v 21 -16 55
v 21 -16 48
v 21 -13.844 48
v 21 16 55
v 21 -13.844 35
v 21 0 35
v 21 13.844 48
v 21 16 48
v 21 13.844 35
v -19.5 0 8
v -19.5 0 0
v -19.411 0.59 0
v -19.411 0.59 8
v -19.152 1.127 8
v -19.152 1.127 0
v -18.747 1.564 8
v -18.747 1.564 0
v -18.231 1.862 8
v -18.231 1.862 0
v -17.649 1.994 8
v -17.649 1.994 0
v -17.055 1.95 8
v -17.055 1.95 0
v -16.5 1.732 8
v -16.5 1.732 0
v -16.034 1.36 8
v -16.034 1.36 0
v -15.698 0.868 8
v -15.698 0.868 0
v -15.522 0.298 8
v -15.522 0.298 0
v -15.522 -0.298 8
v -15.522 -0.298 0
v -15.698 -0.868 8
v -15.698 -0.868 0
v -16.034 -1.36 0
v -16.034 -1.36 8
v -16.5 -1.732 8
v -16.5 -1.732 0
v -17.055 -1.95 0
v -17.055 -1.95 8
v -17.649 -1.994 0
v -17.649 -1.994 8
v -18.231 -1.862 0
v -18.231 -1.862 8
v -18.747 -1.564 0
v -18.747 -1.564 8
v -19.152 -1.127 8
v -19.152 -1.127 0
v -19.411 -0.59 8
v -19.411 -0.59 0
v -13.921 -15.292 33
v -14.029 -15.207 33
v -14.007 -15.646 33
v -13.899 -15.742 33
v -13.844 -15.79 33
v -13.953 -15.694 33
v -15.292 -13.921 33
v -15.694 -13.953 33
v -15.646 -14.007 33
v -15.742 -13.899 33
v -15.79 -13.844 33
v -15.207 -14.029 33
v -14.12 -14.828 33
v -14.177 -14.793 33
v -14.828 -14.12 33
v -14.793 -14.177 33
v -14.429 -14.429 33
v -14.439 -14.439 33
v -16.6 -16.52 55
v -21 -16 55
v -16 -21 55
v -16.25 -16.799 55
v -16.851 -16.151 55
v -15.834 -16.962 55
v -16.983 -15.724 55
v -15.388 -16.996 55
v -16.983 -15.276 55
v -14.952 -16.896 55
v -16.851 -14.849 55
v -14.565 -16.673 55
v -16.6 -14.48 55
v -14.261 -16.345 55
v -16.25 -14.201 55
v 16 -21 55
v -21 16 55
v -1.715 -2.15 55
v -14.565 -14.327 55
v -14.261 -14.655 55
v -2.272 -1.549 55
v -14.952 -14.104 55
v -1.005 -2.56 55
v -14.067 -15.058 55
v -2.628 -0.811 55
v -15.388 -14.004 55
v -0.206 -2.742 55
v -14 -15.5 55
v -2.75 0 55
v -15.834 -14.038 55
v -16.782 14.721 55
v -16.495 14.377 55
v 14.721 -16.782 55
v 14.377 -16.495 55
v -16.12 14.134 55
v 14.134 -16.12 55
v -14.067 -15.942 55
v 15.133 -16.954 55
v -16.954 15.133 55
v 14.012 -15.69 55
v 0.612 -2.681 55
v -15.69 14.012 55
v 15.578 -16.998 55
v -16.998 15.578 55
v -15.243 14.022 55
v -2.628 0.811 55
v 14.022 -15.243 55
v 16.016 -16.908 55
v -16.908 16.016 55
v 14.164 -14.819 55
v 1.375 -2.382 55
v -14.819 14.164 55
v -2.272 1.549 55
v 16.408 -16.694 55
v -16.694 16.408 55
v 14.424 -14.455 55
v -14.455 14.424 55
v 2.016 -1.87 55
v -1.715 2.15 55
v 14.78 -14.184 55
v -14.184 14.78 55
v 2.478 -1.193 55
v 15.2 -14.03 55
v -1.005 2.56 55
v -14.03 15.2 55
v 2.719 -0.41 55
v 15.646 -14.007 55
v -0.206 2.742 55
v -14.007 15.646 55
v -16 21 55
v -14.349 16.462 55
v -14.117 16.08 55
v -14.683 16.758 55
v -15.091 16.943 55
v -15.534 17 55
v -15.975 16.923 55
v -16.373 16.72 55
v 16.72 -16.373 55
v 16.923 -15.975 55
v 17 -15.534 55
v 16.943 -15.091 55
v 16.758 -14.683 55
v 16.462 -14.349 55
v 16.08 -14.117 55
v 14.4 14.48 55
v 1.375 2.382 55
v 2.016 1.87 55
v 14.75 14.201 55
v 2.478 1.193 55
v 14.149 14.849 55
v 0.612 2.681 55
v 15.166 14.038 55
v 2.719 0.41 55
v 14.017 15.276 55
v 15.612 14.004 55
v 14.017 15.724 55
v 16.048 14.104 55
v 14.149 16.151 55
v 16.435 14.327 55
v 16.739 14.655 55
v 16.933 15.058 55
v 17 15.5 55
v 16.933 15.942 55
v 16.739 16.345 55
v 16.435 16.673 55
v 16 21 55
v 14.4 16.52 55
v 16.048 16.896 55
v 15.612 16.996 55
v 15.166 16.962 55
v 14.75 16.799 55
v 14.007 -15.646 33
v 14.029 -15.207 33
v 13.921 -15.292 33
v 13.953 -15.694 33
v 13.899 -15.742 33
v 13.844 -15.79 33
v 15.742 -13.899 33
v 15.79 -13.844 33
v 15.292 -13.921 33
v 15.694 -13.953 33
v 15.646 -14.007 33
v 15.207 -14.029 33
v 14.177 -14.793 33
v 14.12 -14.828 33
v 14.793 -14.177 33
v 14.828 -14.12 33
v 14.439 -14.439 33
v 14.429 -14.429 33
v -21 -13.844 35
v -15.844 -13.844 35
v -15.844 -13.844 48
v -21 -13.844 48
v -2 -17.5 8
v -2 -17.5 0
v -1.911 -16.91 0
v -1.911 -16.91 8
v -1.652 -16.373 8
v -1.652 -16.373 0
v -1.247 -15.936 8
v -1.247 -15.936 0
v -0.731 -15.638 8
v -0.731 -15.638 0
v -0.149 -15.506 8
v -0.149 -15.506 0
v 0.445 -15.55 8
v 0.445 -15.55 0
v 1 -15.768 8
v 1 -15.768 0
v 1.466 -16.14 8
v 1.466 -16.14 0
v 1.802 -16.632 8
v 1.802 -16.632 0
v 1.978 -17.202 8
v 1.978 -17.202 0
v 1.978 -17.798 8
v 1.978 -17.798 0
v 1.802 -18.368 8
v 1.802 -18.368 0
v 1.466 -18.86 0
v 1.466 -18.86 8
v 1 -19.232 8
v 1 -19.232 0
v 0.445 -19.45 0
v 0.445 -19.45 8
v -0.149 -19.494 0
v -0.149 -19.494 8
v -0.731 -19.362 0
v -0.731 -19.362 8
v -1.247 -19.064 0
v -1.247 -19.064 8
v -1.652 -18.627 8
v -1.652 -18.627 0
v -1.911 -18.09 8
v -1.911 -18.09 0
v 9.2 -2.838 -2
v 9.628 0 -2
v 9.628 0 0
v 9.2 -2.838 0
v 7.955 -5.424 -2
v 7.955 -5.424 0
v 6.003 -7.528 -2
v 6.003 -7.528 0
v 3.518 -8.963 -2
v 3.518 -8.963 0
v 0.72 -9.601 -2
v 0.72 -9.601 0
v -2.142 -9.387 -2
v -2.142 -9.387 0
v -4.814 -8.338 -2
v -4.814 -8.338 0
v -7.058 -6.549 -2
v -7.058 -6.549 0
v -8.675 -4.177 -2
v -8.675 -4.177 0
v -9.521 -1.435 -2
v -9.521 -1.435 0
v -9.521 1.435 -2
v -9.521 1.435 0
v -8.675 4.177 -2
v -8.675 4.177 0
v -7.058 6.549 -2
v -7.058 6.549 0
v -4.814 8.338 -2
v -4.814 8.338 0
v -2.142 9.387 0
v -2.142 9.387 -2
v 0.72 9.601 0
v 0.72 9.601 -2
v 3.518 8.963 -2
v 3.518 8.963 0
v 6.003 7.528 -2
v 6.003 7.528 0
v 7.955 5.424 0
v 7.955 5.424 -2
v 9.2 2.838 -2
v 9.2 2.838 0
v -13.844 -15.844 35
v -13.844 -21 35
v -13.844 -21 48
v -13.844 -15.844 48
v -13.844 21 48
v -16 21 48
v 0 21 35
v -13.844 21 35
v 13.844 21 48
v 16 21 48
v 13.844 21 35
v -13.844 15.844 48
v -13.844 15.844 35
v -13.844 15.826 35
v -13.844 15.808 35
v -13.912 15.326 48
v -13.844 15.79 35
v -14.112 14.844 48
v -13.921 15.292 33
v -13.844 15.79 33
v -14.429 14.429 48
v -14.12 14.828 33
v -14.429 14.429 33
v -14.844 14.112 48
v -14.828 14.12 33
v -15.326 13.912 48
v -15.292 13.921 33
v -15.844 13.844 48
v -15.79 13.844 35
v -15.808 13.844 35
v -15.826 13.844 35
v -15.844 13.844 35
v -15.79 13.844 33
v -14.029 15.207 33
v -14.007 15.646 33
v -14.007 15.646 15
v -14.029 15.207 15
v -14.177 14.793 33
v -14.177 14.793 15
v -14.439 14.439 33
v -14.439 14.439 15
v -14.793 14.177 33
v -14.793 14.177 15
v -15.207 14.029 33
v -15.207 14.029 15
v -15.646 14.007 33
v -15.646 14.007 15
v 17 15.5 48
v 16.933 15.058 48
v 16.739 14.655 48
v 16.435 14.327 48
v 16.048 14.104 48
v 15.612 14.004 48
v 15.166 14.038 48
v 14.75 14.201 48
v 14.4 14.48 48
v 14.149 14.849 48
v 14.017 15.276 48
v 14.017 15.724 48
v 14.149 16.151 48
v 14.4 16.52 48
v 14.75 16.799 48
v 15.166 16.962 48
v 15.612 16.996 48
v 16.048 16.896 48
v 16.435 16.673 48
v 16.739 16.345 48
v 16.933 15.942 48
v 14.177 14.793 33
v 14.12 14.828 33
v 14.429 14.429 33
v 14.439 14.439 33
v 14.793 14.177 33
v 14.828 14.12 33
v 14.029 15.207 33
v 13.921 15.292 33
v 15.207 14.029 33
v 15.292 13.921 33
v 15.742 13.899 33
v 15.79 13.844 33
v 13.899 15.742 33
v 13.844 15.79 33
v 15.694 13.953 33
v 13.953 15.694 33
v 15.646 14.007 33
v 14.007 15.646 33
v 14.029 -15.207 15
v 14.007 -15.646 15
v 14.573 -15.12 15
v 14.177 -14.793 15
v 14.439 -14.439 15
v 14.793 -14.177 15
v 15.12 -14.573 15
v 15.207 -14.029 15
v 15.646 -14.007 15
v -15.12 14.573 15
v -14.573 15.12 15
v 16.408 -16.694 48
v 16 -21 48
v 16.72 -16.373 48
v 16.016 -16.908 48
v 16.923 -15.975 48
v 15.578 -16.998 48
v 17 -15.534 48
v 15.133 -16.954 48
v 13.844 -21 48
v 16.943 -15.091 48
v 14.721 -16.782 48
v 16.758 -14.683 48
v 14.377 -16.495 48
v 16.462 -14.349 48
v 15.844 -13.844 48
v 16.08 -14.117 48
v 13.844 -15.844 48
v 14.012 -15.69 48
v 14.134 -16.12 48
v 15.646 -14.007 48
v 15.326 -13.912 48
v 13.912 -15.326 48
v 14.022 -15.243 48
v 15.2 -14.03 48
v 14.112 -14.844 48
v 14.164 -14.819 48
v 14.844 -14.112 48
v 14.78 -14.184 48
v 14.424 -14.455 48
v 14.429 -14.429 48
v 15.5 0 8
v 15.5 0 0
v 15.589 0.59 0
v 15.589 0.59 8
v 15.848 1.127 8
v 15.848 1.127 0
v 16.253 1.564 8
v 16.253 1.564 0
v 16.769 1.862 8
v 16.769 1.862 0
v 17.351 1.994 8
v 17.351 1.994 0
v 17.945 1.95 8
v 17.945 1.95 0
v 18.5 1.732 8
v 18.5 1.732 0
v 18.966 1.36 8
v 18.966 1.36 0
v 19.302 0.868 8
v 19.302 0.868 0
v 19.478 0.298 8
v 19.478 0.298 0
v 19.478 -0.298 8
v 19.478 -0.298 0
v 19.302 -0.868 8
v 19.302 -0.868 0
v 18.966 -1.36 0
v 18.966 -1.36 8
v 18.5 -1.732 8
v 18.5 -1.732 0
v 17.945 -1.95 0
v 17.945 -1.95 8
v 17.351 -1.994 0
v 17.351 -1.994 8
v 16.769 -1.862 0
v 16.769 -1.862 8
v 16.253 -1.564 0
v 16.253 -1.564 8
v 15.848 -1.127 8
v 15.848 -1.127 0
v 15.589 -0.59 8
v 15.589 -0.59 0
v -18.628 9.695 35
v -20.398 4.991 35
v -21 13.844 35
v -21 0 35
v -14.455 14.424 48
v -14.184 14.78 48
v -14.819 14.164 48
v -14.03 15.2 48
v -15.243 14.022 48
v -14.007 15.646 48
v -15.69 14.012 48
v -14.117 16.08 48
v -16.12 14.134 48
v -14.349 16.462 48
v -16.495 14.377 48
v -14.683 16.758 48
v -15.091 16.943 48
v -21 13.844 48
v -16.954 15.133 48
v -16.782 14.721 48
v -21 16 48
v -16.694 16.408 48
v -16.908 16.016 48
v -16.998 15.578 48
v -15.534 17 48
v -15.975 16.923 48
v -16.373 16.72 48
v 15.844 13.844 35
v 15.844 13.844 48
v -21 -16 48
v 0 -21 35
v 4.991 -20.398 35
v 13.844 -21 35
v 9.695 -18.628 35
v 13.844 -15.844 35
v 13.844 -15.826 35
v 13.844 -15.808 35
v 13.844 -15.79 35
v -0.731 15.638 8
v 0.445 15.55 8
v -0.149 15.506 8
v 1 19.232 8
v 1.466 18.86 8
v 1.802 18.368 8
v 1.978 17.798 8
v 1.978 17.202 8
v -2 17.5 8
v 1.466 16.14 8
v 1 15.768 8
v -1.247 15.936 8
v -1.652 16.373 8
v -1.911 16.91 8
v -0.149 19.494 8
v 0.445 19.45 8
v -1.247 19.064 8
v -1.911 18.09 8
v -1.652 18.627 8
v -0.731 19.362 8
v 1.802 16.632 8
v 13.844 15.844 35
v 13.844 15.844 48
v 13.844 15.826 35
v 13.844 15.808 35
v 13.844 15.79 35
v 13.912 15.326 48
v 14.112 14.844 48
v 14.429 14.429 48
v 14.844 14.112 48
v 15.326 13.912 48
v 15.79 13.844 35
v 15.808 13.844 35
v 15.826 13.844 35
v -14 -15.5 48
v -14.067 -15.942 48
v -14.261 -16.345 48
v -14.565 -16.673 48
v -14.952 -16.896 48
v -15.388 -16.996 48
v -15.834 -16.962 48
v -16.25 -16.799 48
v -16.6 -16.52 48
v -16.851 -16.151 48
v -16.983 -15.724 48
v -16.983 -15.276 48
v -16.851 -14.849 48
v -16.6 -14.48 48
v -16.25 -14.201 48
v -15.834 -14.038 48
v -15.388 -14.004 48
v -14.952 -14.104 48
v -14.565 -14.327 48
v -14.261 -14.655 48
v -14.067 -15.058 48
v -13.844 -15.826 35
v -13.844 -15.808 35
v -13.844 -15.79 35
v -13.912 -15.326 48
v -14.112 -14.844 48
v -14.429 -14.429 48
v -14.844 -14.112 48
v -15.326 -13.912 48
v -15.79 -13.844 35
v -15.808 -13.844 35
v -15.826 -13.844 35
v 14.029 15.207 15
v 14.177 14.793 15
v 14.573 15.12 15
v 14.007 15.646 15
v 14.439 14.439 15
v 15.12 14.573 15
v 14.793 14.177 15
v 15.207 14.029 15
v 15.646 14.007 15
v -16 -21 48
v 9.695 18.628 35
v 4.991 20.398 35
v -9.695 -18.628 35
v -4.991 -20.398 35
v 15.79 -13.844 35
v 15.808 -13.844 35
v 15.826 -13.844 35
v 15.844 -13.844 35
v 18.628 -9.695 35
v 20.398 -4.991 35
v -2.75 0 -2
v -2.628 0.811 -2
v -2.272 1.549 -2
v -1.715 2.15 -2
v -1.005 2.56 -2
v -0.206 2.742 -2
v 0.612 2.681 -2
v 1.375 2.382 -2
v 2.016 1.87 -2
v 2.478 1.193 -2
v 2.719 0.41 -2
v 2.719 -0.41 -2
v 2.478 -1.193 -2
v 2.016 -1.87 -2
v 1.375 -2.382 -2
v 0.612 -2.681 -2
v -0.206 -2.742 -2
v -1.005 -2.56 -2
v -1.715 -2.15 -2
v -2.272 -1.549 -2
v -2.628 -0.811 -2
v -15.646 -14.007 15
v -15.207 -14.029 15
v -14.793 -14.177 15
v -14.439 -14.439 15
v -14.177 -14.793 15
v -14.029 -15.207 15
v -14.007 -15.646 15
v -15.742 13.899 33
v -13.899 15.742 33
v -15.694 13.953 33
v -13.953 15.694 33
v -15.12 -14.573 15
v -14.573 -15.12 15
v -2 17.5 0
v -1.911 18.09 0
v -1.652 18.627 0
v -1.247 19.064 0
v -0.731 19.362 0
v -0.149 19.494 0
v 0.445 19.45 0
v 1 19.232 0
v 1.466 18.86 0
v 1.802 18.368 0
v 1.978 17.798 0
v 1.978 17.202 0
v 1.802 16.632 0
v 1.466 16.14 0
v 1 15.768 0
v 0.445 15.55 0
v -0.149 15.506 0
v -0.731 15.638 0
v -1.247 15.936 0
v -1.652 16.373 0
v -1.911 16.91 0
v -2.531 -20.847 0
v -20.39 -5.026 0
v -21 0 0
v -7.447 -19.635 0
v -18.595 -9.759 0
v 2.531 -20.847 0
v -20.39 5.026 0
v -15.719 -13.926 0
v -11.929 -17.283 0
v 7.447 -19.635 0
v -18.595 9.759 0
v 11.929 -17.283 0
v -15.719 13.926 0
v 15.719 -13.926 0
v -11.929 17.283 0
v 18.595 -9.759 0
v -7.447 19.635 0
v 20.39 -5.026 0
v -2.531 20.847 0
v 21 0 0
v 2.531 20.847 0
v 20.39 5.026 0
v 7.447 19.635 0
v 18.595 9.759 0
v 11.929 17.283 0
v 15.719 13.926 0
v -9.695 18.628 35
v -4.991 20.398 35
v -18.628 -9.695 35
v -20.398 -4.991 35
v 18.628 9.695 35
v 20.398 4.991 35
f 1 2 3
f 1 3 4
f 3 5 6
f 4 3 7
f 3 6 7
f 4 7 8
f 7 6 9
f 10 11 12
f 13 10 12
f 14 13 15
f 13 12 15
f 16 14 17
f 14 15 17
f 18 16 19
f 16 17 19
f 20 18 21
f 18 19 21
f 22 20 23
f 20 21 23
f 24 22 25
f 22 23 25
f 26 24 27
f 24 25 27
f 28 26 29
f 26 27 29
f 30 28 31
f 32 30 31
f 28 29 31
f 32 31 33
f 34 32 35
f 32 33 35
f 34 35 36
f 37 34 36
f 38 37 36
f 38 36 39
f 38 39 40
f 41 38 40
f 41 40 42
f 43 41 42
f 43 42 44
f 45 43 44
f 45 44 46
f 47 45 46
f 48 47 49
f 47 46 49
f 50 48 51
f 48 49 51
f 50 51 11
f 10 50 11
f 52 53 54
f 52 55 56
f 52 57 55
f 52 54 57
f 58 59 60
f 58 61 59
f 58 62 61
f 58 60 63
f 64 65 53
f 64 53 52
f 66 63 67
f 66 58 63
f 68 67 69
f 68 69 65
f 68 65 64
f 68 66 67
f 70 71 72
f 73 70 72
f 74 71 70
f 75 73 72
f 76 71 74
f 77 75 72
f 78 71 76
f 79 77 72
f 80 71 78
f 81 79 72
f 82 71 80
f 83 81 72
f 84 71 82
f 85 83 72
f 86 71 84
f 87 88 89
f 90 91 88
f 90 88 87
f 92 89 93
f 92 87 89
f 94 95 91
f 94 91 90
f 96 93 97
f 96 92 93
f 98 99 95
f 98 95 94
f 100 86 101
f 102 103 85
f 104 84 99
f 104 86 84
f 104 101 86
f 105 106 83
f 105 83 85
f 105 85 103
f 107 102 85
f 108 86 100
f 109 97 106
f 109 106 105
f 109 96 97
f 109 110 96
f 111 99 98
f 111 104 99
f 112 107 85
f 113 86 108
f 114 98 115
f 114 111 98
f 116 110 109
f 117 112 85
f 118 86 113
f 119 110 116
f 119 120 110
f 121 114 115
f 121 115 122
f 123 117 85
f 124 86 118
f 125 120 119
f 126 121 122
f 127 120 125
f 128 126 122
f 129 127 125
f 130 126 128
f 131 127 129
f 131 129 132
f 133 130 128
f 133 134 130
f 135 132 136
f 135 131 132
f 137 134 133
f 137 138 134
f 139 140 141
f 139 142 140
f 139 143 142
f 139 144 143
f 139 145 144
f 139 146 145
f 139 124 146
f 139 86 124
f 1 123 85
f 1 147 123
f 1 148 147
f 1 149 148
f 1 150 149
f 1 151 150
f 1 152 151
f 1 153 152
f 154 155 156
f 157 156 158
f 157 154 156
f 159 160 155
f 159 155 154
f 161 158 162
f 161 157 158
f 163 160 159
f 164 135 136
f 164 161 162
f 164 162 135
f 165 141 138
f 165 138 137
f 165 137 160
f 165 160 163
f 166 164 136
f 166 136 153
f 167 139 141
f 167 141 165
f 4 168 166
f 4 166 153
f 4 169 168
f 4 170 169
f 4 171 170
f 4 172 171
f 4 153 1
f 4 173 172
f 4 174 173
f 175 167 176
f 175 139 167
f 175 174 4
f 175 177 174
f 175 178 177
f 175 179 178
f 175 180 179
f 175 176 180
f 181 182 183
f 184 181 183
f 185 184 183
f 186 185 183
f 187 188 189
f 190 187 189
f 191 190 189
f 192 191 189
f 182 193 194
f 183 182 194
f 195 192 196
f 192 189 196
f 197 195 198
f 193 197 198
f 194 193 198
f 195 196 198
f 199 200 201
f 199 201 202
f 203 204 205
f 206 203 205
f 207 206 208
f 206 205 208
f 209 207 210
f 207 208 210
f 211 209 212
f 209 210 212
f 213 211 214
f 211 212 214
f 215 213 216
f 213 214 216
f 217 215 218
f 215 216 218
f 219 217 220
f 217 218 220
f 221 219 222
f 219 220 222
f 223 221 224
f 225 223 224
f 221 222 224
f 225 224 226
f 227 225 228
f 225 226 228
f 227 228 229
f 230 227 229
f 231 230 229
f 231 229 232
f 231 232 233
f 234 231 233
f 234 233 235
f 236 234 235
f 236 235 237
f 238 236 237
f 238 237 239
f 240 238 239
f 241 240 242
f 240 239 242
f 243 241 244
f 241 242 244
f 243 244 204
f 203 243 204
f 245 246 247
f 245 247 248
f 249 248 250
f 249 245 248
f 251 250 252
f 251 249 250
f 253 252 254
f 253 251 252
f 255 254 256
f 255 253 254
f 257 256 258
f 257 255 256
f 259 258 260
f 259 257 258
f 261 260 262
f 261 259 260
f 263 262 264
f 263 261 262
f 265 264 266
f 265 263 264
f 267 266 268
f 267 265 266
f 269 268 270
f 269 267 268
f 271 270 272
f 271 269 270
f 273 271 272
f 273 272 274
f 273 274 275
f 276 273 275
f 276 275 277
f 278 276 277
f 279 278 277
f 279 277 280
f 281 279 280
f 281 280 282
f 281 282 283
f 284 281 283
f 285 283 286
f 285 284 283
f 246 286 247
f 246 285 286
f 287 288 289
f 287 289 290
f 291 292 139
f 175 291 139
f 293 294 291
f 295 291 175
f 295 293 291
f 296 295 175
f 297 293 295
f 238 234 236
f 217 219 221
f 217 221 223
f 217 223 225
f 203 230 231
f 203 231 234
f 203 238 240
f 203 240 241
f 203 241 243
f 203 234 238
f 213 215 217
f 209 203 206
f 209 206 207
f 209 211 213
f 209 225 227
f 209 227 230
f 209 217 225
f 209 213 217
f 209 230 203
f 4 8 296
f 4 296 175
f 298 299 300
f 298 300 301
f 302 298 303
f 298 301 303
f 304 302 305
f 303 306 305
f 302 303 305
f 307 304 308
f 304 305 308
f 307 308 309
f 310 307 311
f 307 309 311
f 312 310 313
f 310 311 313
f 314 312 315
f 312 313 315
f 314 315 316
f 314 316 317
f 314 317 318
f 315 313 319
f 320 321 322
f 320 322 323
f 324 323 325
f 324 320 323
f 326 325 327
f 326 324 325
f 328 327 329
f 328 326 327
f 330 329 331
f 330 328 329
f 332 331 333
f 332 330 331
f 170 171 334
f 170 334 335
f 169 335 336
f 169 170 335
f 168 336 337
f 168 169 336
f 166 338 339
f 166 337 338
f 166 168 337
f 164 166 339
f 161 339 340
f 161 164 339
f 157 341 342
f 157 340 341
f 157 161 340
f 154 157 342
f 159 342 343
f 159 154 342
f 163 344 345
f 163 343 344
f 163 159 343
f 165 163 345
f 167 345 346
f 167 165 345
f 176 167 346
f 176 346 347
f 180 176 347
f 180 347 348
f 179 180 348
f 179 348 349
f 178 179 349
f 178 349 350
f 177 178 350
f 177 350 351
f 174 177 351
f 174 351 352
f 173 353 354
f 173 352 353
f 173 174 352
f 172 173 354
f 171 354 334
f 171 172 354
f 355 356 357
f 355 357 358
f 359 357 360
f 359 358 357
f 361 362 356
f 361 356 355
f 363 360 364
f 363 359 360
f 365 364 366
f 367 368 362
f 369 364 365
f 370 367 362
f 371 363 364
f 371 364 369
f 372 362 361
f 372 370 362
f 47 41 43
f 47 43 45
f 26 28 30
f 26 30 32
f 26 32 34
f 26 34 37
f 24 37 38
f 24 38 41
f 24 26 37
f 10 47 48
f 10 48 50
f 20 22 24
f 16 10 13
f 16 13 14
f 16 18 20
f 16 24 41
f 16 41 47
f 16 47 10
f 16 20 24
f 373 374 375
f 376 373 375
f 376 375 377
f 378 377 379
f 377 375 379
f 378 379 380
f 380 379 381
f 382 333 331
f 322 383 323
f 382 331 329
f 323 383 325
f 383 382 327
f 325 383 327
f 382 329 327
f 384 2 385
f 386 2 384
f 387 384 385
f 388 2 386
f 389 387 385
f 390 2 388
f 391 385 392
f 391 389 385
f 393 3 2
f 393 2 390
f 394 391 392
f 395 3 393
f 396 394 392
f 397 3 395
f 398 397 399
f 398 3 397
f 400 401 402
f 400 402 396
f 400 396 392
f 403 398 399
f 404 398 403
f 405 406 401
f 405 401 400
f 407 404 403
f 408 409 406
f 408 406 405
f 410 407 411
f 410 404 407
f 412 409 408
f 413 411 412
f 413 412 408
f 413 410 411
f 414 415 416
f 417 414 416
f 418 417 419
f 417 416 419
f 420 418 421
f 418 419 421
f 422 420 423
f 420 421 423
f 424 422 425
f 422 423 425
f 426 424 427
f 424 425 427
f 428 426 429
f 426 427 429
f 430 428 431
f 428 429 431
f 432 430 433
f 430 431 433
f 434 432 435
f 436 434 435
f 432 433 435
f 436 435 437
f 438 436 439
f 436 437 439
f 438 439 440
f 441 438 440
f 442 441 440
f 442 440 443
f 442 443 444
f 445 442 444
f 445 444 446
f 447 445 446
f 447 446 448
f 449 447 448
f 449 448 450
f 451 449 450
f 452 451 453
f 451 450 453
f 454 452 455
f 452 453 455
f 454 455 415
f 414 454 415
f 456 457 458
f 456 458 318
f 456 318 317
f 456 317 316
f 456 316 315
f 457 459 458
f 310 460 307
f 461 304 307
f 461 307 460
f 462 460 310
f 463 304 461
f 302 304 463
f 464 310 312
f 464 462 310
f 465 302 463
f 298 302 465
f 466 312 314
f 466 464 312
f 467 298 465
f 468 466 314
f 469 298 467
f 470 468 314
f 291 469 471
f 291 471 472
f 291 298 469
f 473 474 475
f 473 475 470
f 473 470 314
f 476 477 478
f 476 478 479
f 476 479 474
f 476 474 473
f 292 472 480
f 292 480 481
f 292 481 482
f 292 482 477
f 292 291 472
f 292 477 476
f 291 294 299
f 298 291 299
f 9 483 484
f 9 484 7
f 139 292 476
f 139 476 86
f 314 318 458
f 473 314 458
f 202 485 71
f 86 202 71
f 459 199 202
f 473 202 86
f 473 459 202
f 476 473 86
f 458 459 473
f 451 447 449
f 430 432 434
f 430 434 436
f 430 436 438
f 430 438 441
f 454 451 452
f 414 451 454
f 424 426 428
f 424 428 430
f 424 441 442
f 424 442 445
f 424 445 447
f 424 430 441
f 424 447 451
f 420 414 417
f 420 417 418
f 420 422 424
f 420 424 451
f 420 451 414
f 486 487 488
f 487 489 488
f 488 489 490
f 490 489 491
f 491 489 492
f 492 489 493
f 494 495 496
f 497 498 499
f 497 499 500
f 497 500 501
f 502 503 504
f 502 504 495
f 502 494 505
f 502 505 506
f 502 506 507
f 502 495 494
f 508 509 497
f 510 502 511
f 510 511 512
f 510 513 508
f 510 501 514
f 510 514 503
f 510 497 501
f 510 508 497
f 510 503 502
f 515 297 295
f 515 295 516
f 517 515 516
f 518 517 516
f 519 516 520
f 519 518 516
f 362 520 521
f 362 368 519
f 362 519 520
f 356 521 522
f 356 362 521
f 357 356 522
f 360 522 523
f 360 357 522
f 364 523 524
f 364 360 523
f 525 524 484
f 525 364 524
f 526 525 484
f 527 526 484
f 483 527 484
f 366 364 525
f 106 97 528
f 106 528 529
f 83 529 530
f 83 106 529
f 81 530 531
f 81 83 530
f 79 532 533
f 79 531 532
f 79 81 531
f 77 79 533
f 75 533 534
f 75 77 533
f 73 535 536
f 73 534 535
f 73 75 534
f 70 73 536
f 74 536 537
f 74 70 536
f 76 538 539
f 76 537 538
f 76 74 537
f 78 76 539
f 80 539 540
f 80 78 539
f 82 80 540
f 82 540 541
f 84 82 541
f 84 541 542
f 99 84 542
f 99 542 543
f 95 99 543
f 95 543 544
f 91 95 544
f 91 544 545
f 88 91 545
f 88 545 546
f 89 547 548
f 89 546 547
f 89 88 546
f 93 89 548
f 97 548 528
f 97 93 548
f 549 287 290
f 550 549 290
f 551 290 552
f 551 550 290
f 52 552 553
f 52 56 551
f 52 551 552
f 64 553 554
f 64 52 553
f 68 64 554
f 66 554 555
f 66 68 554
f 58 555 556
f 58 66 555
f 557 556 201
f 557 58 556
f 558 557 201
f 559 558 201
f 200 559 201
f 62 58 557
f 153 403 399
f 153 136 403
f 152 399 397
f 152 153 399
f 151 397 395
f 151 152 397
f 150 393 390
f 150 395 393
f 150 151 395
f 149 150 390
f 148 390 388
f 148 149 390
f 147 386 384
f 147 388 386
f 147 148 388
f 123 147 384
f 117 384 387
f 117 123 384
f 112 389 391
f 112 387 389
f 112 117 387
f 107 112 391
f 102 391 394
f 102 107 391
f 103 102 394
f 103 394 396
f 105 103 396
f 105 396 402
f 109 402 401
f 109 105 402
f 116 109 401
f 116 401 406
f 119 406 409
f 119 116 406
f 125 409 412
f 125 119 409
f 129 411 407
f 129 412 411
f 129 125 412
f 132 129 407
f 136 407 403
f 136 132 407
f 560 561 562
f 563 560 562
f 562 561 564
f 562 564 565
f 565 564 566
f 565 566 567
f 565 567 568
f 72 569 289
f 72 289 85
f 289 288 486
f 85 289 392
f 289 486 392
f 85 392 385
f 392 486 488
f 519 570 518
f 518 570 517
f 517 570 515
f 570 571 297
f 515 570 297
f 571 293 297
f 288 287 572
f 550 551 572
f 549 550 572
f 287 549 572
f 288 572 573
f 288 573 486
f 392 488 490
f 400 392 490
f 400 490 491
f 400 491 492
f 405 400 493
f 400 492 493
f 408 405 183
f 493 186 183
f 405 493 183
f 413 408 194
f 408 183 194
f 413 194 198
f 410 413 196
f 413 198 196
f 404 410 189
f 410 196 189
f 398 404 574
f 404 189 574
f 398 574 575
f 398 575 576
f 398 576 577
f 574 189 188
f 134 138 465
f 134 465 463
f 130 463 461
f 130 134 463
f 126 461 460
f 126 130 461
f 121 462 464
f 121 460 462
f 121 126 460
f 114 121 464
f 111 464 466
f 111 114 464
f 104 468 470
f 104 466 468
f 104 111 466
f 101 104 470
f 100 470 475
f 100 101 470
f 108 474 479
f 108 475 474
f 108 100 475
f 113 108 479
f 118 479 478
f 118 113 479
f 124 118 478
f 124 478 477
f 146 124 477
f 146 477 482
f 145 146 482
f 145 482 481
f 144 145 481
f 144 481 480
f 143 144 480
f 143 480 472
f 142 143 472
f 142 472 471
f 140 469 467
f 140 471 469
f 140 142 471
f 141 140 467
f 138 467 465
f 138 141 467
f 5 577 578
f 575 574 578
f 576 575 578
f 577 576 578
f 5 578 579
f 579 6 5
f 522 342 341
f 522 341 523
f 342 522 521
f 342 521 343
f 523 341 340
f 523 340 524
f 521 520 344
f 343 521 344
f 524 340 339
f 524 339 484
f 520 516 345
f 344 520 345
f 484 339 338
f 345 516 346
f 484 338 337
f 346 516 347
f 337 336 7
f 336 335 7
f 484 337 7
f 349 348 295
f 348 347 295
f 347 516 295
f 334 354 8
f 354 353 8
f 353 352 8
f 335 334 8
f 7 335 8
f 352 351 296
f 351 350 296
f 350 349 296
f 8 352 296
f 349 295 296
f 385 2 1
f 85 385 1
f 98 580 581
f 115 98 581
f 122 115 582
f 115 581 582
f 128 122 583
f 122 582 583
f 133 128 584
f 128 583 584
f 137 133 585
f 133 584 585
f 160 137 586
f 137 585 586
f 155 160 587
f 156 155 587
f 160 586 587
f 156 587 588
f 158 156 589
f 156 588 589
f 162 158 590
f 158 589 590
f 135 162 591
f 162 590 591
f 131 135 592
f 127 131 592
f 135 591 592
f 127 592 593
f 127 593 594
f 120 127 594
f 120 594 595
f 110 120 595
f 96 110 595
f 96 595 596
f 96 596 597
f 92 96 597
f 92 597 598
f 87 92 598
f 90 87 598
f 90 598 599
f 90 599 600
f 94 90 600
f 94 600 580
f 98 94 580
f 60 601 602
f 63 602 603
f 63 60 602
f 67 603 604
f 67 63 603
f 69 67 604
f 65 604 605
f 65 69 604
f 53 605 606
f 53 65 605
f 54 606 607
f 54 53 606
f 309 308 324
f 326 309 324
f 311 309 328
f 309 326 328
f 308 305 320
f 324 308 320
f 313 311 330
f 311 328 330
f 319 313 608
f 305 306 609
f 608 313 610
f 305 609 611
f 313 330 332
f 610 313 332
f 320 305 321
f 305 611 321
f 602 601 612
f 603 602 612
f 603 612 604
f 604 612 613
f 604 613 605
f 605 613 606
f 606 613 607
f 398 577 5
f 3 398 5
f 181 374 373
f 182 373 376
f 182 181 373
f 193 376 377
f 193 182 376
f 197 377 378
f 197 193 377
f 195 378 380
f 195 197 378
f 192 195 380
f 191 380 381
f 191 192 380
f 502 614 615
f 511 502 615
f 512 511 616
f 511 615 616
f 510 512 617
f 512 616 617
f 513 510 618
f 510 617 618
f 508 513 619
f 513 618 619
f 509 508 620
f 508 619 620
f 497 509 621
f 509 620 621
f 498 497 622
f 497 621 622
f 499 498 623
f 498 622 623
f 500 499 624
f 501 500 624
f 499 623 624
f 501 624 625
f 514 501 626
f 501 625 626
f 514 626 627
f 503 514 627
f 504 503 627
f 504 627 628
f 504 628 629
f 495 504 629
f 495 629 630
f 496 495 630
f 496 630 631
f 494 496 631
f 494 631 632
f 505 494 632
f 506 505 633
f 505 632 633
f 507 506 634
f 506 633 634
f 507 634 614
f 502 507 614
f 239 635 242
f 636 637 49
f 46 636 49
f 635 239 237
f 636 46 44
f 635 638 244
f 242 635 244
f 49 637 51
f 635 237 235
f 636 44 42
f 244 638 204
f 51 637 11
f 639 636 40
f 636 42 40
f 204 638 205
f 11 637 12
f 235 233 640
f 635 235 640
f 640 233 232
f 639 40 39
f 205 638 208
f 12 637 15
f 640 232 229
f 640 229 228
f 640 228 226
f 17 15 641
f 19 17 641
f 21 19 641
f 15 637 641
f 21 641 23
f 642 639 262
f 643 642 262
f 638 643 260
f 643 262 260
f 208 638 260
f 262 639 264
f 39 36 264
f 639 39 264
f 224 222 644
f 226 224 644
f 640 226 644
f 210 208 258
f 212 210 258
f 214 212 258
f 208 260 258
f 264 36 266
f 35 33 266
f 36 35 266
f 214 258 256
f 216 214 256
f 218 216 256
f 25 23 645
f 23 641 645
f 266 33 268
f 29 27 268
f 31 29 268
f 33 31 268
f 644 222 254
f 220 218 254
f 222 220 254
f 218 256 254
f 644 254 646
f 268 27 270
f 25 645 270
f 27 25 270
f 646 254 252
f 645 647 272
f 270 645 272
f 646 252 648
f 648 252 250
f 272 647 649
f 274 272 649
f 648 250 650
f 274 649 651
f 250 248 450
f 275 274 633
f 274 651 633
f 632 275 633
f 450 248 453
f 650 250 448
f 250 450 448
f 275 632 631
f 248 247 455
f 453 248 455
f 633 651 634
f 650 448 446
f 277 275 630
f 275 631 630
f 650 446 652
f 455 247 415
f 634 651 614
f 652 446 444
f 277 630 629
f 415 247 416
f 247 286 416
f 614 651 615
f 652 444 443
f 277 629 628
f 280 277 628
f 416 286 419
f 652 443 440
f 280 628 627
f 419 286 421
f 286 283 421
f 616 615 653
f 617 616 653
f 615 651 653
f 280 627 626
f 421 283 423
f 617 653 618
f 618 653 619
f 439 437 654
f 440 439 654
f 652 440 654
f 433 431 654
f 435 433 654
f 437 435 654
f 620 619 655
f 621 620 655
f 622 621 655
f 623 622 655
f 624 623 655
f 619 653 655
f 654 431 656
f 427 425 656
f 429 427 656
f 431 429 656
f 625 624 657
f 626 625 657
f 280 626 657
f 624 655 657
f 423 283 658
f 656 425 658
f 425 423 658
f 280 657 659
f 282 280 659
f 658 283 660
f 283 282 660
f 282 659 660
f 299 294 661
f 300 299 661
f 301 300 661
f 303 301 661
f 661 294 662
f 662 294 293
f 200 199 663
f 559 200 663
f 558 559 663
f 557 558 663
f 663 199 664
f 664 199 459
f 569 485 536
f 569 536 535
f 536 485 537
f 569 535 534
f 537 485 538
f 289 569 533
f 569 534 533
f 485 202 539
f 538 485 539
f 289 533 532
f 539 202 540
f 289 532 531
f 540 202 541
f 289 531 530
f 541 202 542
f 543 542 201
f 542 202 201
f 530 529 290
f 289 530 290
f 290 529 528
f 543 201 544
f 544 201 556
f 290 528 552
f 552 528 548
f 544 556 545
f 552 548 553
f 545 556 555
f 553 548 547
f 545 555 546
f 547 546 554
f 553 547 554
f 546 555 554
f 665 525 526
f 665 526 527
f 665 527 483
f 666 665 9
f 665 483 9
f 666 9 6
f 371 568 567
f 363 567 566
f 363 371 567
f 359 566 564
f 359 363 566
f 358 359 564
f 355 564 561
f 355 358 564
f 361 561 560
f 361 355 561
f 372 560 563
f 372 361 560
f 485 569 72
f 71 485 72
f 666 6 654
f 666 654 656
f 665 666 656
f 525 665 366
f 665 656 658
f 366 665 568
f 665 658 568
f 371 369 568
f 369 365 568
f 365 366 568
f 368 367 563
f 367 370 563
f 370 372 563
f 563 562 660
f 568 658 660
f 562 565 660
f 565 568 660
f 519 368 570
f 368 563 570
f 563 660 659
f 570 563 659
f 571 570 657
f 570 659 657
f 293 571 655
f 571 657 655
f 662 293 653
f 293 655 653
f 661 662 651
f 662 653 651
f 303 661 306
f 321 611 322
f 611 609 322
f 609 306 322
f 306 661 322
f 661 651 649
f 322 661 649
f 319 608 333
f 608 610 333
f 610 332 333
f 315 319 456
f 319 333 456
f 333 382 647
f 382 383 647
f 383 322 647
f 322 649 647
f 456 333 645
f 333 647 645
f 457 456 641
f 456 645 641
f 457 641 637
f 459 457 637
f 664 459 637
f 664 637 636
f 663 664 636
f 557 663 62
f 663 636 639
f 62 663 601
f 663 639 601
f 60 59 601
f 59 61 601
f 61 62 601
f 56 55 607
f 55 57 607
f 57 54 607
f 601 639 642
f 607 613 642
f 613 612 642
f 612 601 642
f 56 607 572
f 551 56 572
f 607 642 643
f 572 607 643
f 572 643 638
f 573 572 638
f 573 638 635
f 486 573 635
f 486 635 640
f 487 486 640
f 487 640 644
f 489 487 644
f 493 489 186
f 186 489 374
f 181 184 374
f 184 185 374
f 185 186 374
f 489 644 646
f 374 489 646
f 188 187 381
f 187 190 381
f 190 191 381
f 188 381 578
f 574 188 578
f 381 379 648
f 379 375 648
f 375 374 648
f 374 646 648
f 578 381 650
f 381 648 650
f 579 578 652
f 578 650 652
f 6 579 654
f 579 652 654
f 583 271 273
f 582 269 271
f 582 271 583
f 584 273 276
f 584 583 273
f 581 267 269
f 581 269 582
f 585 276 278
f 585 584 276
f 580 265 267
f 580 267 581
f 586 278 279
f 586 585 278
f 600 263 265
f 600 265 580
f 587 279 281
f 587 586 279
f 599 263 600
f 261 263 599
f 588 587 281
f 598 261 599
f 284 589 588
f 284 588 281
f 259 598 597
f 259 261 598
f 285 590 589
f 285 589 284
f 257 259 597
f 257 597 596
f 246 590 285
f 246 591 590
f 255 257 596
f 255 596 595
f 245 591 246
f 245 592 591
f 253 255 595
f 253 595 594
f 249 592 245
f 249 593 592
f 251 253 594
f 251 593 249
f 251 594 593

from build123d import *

# Parameters (mm, degrees)
SKETCH2_R               = 21
BOSS_EXTRUDE1_DEPTH     = 35
SKETCH3_W               = 42
SKETCH3_H               = 42
BOSS_EXTRUDE2_DEPTH     = 20
CHAMFER1_SIZE           = 5
CUT_EXTRUDE1_DEPTH      = 20
CUT_EXTRUDE1_DEPTH_BACK = 46.90206967
SKETCH4_R               = 1.5
CUT_EXTRUDE2_START      = 2
CUT_EXTRUDE2_DEPTH      = 15
SKETCH6_R               = 2.75
CUT_EXTRUDE3_DEPTH      = 63.505999712
SKETCH8_R               = 2
CUT_EXTRUDE4_DEPTH      = 8
BOSS_EXTRUDE3_START     = 2
SKETCH9_R               = 9.628132553
SKETCH9_R_2             = 2.75
BOSS_EXTRUDE3_DEPTH     = 2


with BuildPart() as part:
    # Sketch2 → Boss-Extrude1 (new body)
    with BuildSketch(Plane.XY):
        Circle(SKETCH2_R)
    extrude(amount=BOSS_EXTRUDE1_DEPTH)

    # Sketch3 → Boss-Extrude2 (add)
    with BuildSketch(Plane.XY.offset(35)):
        Rectangle(SKETCH3_W, SKETCH3_H)
    extrude(amount=BOSS_EXTRUDE2_DEPTH)

    # Chamfer1
    chamfer1_edges = [part.edges().sort_by_distance(p)[0] for p in [
        (-21, -21, 45),
        (21, -21, 45),
        (21, 21, 45),
        (-21, 21, 45),
    ]]
    chamfer(chamfer1_edges, length=CHAMFER1_SIZE)

    # Sketch4 → Cut-Extrude1 (cut, two sides: drawn at the far end of the back side and taken through both)
    with BuildSketch(Plane(origin=(0, 0, 35), x_dir=(-1, 0, 0), z_dir=(0, 0, -1)).offset(-CUT_EXTRUDE1_DEPTH_BACK)):
        with Locations(Location((15.5, 15.5, 0), (0, 0, 174.410746944))):
            Circle(SKETCH4_R)
        with Locations(Location((-15.5, 15.5, 0), (0, 0, 180))):
            Circle(SKETCH4_R)
        with Locations(Location((15.5, -15.5, 0), (0, 0, 180))):
            Circle(SKETCH4_R)
        with Locations(Location((-15.5, -15.5, 0), (0, 0, 95.589253056))):
            Circle(SKETCH4_R)
    extrude(amount=CUT_EXTRUDE1_DEPTH + CUT_EXTRUDE1_DEPTH_BACK, mode=Mode.SUBTRACT)

    # Sketch5 → Cut-Extrude2 (cut)
    with BuildSketch(Plane(origin=(0, 0, 35), x_dir=(-1, 0, 0), z_dir=(0, 0, -1)).offset(CUT_EXTRUDE2_START)):
        with BuildLine():
            Line((15.843578324, 13.843578324), (23.156421676, 13.843578324))
            Line((23.156421676, 13.843578324), (23.156421676, 23.156421676))
            Line((23.156421676, 23.156421676), (13.843578324, 23.156421676))
            Line((13.843578324, 23.156421676), (13.843578324, 15.843578324))
            ThreePointArc((13.843578324, 15.843578324), (14.429364762, 14.429364762), (15.843578324, 13.843578324))
        make_face()
        with BuildLine():
            Line((23.156421676, -13.843578324), (23.156421676, -23.156421676))
            Line((23.156421676, -23.156421676), (13.843578324, -23.156421676))
            Line((13.843578324, -23.156421676), (13.843578324, -15.843578324))
            ThreePointArc((13.843578324, -15.843578324), (14.429364762, -14.429364762), (15.843578324, -13.843578324))
            Line((15.843578324, -13.843578324), (23.156421676, -13.843578324))
        make_face()
        with BuildLine():
            Line((-23.156421676, 13.843578324), (-23.156421676, 23.156421676))
            Line((-23.156421676, 23.156421676), (-13.843578324, 23.156421676))
            Line((-13.843578324, 23.156421676), (-13.843578324, 15.843578324))
            ThreePointArc((-13.843578324, 15.843578324), (-14.429364762, 14.429364762), (-15.843578324, 13.843578324))
            Line((-15.843578324, 13.843578324), (-23.156421676, 13.843578324))
        make_face()
        with BuildLine():
            Line((-15.843578324, -13.843578324), (-23.156421676, -13.843578324))
            Line((-23.156421676, -13.843578324), (-23.156421676, -23.156421676))
            Line((-23.156421676, -23.156421676), (-13.843578324, -23.156421676))
            Line((-13.843578324, -23.156421676), (-13.843578324, -15.843578324))
            ThreePointArc((-13.843578324, -15.843578324), (-14.429364762, -14.429364762), (-15.843578324, -13.843578324))
        make_face()
    extrude(amount=-CUT_EXTRUDE2_DEPTH, mode=Mode.SUBTRACT)

    # Sketch6 → Cut-Extrude3 (cut, through all)
    with BuildSketch(Plane(origin=(0, 0, 0), x_dir=(-1, 0, 0), z_dir=(0, 0, -1))):
        Circle(SKETCH6_R)
    extrude(amount=-CUT_EXTRUDE3_DEPTH, mode=Mode.SUBTRACT)

    # Sketch8 → Cut-Extrude4 (cut)
    with BuildSketch(Plane(origin=(0, 0, 0), x_dir=(-1, 0, 0), z_dir=(0, 0, -1))):
        with Locations((0, 17.5)):
            Circle(SKETCH8_R)
        with Locations((17.5, 0)):
            Circle(SKETCH8_R)
        with Locations((0, -17.5)):
            Circle(SKETCH8_R)
        with Locations((-17.5, 0)):
            Circle(SKETCH8_R)
    extrude(amount=-CUT_EXTRUDE4_DEPTH, mode=Mode.SUBTRACT)

    # Sketch9 → Boss-Extrude3 (add)
    with BuildSketch(Plane(origin=(0, 0, 0), x_dir=(-1, 0, 0), z_dir=(0, 0, -1)).offset(BOSS_EXTRUDE3_START)):
        with Locations(Location((0, 0, 0), (0, 0, 180))):
            Circle(SKETCH9_R)
        Circle(SKETCH9_R_2, mode=Mode.SUBTRACT)
    extrude(amount=-BOSS_EXTRUDE3_DEPTH)


solid = part.part
